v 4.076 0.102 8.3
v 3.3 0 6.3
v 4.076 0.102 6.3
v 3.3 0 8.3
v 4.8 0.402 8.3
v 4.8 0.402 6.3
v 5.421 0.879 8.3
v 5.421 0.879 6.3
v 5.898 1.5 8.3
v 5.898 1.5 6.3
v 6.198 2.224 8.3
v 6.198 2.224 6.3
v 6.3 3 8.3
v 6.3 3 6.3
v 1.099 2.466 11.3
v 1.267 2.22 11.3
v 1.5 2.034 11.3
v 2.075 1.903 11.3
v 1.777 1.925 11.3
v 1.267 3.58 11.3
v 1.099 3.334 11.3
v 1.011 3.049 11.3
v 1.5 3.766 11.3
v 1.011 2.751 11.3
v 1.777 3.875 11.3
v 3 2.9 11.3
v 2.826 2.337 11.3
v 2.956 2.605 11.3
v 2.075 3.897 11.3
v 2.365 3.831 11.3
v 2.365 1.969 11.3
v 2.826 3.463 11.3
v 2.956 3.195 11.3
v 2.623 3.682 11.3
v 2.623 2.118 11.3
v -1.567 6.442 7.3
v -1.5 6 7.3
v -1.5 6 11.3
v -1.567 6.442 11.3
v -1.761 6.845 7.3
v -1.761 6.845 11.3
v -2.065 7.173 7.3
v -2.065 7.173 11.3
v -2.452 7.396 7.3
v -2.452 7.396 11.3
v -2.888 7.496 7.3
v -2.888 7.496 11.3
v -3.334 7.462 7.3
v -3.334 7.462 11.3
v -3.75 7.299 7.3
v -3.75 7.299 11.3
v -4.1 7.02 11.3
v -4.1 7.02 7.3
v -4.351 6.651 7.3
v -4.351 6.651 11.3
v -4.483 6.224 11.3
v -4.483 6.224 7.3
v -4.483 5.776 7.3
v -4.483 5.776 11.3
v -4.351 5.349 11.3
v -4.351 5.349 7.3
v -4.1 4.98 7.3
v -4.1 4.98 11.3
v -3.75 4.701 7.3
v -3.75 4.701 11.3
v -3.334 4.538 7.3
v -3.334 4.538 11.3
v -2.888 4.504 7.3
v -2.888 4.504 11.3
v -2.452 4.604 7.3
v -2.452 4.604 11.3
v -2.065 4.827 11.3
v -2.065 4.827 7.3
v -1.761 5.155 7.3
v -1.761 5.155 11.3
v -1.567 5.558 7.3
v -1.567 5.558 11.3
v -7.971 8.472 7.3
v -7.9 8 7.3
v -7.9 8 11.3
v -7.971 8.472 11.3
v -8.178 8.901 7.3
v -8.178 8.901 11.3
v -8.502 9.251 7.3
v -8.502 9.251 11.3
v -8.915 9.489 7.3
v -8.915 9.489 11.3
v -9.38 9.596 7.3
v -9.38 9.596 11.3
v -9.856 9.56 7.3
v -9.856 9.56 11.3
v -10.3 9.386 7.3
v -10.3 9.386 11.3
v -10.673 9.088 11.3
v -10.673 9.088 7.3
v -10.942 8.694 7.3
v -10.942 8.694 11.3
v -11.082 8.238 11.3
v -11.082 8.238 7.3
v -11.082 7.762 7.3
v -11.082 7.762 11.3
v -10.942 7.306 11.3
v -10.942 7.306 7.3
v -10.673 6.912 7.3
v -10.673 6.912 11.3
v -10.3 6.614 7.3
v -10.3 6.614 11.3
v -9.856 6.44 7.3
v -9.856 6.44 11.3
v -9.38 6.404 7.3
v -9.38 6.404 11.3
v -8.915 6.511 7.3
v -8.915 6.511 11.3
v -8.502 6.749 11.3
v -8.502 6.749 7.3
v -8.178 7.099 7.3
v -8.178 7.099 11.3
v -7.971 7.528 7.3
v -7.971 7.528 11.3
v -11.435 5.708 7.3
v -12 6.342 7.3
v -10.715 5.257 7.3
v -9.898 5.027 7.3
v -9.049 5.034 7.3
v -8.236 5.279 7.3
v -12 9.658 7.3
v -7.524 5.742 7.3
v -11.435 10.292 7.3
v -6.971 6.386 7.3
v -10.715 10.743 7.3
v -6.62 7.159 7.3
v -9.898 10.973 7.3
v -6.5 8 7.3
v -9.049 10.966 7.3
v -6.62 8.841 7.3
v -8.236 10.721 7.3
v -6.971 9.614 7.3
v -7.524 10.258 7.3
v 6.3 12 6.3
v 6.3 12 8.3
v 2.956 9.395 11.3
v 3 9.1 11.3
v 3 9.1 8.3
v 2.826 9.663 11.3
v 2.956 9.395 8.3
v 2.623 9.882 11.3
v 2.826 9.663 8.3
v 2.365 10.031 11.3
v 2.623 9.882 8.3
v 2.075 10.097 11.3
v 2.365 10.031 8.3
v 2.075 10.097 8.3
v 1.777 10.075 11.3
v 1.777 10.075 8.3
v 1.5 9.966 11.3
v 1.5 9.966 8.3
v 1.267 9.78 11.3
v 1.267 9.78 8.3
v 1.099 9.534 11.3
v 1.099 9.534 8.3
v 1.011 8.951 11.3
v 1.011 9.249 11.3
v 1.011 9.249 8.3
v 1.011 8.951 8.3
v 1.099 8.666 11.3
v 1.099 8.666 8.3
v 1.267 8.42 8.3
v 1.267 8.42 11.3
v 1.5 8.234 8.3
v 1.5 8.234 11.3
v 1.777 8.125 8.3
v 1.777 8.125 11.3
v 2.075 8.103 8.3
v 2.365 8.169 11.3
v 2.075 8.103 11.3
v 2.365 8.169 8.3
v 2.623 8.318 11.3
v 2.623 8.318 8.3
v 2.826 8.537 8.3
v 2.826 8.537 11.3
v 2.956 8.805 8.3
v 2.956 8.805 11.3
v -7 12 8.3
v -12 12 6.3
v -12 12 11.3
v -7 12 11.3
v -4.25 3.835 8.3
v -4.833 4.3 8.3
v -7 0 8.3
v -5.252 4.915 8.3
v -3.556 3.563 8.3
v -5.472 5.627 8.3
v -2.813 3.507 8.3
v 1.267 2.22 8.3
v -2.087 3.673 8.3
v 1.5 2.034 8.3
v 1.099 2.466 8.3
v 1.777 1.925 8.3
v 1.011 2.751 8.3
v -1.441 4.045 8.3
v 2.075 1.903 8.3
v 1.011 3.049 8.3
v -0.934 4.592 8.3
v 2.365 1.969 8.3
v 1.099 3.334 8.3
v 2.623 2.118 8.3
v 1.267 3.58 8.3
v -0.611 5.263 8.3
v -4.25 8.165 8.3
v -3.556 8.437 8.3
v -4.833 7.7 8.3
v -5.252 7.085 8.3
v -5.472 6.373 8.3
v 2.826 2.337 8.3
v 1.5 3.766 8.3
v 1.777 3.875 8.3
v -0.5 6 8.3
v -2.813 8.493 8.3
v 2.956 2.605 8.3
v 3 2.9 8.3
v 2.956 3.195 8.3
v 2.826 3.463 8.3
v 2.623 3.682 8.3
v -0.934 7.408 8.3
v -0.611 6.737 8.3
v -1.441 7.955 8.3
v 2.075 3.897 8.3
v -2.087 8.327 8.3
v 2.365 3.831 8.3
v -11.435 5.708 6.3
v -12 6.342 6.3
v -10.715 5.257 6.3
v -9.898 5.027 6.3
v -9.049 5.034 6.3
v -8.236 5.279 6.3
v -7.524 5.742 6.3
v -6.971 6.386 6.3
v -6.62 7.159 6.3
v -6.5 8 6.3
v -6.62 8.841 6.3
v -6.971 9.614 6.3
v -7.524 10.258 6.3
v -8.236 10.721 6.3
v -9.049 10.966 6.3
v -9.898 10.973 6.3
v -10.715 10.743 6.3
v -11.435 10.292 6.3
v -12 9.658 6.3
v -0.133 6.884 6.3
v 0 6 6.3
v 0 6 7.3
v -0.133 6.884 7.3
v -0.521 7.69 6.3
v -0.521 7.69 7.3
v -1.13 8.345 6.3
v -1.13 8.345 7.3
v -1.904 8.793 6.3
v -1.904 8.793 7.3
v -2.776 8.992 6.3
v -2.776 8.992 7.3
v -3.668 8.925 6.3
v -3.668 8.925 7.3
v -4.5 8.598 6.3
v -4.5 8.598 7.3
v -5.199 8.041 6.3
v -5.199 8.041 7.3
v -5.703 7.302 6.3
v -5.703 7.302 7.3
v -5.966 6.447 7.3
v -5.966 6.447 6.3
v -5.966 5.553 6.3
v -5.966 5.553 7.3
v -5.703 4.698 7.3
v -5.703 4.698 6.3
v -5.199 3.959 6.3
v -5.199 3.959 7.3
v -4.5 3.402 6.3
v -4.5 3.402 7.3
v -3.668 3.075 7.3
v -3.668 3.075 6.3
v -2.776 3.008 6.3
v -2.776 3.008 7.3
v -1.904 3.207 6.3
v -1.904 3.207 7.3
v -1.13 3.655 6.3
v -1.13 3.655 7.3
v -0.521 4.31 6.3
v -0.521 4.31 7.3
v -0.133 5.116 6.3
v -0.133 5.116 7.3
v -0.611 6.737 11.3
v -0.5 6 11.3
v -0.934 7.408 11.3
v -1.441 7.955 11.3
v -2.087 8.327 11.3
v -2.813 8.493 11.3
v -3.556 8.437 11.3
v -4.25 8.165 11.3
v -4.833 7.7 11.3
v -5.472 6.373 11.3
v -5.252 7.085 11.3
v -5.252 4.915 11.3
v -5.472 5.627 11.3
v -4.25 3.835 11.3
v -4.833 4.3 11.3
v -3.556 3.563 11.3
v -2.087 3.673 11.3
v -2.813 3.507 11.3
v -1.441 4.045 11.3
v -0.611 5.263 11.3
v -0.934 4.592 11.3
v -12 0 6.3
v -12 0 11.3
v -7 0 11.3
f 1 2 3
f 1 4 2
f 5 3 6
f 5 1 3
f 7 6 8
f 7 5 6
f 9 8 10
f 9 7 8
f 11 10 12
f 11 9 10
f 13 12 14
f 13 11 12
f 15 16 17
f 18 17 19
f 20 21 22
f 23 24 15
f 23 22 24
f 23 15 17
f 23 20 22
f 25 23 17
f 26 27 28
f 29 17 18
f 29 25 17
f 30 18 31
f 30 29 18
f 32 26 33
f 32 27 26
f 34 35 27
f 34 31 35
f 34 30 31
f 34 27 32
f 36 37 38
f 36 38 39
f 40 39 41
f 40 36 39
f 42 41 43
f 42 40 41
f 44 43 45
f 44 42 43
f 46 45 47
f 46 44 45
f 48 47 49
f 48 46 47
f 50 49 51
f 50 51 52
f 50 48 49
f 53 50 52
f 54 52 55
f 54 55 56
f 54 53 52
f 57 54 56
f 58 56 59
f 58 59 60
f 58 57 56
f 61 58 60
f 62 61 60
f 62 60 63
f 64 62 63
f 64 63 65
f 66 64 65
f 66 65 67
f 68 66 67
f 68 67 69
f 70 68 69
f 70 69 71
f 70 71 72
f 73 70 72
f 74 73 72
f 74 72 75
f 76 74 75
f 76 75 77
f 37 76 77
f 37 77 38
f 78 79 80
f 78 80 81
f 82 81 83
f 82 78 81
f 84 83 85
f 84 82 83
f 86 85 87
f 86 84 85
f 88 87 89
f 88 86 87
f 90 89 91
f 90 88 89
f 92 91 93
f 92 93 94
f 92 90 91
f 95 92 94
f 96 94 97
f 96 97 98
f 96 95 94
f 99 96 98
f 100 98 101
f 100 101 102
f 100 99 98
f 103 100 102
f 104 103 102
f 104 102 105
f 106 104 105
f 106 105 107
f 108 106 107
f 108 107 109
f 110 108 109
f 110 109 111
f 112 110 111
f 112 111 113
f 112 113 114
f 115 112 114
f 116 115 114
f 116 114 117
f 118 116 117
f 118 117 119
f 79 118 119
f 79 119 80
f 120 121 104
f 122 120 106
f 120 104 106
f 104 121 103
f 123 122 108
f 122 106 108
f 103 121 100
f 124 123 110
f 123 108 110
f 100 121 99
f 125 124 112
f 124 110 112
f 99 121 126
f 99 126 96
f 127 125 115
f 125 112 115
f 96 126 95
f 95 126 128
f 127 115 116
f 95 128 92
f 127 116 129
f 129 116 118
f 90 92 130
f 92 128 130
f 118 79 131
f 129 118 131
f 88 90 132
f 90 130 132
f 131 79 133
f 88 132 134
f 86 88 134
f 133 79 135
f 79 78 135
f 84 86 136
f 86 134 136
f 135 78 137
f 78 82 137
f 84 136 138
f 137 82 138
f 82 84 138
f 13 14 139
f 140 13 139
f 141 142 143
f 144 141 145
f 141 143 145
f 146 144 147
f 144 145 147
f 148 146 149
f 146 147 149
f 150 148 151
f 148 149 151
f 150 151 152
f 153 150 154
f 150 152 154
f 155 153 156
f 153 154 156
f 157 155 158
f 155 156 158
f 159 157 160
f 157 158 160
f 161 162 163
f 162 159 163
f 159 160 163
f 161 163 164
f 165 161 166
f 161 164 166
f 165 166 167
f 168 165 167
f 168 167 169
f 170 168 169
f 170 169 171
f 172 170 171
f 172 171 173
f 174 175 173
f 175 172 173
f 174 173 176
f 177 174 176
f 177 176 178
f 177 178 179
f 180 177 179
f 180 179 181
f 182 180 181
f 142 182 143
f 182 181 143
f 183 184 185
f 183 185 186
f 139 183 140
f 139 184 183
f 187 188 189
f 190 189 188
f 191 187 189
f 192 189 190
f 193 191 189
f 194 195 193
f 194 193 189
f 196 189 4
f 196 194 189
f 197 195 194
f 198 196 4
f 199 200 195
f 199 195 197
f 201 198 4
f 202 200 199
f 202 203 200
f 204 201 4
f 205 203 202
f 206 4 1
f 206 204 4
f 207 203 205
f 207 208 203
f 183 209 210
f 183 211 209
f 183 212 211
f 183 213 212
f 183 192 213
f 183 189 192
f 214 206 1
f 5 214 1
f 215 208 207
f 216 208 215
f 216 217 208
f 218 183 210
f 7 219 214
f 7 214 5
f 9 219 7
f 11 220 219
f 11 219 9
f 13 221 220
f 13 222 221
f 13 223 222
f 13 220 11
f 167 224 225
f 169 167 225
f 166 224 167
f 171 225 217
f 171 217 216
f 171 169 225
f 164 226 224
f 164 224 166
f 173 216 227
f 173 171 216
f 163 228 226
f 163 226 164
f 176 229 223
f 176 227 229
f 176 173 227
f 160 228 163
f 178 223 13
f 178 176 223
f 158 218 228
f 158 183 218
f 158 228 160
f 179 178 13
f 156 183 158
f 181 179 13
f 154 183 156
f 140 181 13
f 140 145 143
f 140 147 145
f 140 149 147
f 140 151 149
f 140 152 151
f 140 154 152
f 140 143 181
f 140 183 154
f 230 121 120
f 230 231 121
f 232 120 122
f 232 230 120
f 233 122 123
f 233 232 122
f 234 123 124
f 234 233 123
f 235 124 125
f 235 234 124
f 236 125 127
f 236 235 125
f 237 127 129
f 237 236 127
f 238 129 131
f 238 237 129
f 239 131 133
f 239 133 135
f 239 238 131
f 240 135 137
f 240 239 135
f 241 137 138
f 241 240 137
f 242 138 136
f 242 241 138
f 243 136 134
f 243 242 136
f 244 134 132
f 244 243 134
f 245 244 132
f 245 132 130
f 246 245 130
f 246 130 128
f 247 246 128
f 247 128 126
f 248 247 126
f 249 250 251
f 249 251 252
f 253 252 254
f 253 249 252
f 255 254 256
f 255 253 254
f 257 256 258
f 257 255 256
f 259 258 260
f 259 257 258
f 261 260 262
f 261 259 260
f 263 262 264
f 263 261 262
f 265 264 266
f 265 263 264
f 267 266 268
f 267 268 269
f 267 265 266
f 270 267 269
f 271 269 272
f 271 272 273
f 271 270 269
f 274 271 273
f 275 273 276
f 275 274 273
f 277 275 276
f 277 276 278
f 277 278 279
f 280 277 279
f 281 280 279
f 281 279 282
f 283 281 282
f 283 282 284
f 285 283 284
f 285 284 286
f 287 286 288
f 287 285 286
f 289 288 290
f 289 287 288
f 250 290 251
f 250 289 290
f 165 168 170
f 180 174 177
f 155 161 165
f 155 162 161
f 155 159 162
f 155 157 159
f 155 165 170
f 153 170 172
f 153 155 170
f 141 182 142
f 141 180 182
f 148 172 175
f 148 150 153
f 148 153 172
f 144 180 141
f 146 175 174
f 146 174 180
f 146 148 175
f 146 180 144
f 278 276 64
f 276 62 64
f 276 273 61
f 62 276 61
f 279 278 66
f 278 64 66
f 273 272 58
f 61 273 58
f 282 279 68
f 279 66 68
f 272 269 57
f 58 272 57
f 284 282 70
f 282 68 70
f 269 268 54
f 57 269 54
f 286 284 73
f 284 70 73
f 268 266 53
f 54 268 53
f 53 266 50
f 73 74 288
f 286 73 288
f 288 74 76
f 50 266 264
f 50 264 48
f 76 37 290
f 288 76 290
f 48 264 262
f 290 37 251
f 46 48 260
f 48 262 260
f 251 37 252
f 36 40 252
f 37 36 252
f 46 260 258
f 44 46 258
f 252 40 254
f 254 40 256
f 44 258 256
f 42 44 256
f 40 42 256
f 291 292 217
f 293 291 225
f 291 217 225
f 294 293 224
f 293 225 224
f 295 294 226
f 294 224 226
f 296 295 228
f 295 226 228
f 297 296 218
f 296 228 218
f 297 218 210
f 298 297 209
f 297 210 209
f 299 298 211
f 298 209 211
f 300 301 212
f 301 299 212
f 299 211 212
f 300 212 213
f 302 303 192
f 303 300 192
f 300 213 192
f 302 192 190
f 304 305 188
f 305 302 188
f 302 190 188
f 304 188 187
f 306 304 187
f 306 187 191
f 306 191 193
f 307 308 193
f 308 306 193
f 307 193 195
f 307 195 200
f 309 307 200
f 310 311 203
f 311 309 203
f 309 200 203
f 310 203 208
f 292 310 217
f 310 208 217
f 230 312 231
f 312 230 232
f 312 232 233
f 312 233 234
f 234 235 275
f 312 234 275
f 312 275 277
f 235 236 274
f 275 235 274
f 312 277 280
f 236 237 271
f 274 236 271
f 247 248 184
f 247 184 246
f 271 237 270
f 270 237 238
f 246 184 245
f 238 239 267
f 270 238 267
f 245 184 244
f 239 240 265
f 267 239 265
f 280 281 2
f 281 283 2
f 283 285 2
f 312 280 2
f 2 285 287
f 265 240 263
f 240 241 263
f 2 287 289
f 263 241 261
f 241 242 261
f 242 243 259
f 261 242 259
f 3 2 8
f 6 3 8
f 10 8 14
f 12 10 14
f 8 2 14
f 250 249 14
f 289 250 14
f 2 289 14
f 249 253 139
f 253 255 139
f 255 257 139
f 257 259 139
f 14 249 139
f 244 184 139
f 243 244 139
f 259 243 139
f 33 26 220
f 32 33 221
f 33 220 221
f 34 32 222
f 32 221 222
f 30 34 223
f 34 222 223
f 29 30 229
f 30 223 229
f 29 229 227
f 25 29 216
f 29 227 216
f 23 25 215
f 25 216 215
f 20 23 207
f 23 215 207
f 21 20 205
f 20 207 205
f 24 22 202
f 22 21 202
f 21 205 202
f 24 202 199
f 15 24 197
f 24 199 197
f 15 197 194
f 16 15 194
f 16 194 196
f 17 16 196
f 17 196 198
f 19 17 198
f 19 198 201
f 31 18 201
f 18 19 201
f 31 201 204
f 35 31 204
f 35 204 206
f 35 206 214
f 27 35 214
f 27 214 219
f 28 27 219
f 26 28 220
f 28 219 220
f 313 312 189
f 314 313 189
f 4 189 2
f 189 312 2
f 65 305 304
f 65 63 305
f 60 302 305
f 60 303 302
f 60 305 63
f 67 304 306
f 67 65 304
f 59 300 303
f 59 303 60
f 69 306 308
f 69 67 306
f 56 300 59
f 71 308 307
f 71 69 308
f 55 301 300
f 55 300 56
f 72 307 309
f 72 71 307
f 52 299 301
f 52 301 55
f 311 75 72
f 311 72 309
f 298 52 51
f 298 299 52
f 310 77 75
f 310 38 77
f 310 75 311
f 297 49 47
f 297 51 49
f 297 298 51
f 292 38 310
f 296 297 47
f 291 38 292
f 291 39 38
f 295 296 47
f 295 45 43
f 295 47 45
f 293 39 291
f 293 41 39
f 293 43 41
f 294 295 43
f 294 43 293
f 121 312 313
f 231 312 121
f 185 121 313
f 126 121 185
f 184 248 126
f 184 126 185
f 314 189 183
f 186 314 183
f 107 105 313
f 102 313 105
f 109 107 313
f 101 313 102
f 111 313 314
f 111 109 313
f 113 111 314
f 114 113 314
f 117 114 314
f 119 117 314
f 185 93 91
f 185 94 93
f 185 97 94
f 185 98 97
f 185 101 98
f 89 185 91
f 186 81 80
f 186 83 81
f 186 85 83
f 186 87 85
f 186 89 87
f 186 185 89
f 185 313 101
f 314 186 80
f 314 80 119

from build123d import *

# Parameters (mm, degrees)
SKETCH_W        = 18.3
SKETCH_H        = 12
SKETCH_R        = 1.5
SKETCH_R_2      = 1.6
PAD_DEPTH       = 5
SKETCH001_W     = 14
SKETCH001_H     = 12
SKETCH001_R     = 2.5
SKETCH001_R_2   = 1
POCKET_DEPTH    = 3.001
SKETCH002_R     = 3
POCKET001_DEPTH = 1
FILLET_R        = 3


with BuildPart() as part:
    # Sketch → Pad (new body)
    with BuildSketch(Plane.XY):
        with Locations((9.15, 6)):
            Rectangle(SKETCH_W, SKETCH_H)
        with Locations((9, 6)):
            Circle(SKETCH_R, mode=Mode.SUBTRACT)
        with Locations((2.5, 8)):
            Circle(SKETCH_R_2, mode=Mode.SUBTRACT)
    extrude(amount=PAD_DEPTH)

    # Sketch001 (on DatumPlane) → Pocket (cut, through all)
    with BuildSketch(Plane.XY.offset(2)):
        with Locations((12, 6)):
            Rectangle(SKETCH001_W, SKETCH001_H)
        with Locations((9, 6)):
            Circle(SKETCH001_R, mode=Mode.SUBTRACT)
        with Locations((14, 9.1)):
            Circle(SKETCH001_R_2, mode=Mode.SUBTRACT)
        with Locations((14, 2.9)):
            Circle(SKETCH001_R_2, mode=Mode.SUBTRACT)
    extrude(amount=POCKET_DEPTH, mode=Mode.SUBTRACT)

    # Sketch002 → Pocket001 (cut)
    with BuildSketch(Plane.XY):
        with Locations((2.5, 8)):
            Circle(SKETCH002_R)
        with Locations((9, 6)):
            Circle(SKETCH002_R)
    extrude(amount=POCKET001_DEPTH, mode=Mode.SUBTRACT)

    # Fillet
    fillet_edges = [part.edges().sort_by_distance(p)[0] for p in [
        (18.3, 0, 1),
    ]]
    fillet(fillet_edges, radius=FILLET_R)


with BuildPart() as part_1:
    # Body placement: moved
    add(part.part.moved(Location((-12, 0, 6.3))))


solid = part_1.part
